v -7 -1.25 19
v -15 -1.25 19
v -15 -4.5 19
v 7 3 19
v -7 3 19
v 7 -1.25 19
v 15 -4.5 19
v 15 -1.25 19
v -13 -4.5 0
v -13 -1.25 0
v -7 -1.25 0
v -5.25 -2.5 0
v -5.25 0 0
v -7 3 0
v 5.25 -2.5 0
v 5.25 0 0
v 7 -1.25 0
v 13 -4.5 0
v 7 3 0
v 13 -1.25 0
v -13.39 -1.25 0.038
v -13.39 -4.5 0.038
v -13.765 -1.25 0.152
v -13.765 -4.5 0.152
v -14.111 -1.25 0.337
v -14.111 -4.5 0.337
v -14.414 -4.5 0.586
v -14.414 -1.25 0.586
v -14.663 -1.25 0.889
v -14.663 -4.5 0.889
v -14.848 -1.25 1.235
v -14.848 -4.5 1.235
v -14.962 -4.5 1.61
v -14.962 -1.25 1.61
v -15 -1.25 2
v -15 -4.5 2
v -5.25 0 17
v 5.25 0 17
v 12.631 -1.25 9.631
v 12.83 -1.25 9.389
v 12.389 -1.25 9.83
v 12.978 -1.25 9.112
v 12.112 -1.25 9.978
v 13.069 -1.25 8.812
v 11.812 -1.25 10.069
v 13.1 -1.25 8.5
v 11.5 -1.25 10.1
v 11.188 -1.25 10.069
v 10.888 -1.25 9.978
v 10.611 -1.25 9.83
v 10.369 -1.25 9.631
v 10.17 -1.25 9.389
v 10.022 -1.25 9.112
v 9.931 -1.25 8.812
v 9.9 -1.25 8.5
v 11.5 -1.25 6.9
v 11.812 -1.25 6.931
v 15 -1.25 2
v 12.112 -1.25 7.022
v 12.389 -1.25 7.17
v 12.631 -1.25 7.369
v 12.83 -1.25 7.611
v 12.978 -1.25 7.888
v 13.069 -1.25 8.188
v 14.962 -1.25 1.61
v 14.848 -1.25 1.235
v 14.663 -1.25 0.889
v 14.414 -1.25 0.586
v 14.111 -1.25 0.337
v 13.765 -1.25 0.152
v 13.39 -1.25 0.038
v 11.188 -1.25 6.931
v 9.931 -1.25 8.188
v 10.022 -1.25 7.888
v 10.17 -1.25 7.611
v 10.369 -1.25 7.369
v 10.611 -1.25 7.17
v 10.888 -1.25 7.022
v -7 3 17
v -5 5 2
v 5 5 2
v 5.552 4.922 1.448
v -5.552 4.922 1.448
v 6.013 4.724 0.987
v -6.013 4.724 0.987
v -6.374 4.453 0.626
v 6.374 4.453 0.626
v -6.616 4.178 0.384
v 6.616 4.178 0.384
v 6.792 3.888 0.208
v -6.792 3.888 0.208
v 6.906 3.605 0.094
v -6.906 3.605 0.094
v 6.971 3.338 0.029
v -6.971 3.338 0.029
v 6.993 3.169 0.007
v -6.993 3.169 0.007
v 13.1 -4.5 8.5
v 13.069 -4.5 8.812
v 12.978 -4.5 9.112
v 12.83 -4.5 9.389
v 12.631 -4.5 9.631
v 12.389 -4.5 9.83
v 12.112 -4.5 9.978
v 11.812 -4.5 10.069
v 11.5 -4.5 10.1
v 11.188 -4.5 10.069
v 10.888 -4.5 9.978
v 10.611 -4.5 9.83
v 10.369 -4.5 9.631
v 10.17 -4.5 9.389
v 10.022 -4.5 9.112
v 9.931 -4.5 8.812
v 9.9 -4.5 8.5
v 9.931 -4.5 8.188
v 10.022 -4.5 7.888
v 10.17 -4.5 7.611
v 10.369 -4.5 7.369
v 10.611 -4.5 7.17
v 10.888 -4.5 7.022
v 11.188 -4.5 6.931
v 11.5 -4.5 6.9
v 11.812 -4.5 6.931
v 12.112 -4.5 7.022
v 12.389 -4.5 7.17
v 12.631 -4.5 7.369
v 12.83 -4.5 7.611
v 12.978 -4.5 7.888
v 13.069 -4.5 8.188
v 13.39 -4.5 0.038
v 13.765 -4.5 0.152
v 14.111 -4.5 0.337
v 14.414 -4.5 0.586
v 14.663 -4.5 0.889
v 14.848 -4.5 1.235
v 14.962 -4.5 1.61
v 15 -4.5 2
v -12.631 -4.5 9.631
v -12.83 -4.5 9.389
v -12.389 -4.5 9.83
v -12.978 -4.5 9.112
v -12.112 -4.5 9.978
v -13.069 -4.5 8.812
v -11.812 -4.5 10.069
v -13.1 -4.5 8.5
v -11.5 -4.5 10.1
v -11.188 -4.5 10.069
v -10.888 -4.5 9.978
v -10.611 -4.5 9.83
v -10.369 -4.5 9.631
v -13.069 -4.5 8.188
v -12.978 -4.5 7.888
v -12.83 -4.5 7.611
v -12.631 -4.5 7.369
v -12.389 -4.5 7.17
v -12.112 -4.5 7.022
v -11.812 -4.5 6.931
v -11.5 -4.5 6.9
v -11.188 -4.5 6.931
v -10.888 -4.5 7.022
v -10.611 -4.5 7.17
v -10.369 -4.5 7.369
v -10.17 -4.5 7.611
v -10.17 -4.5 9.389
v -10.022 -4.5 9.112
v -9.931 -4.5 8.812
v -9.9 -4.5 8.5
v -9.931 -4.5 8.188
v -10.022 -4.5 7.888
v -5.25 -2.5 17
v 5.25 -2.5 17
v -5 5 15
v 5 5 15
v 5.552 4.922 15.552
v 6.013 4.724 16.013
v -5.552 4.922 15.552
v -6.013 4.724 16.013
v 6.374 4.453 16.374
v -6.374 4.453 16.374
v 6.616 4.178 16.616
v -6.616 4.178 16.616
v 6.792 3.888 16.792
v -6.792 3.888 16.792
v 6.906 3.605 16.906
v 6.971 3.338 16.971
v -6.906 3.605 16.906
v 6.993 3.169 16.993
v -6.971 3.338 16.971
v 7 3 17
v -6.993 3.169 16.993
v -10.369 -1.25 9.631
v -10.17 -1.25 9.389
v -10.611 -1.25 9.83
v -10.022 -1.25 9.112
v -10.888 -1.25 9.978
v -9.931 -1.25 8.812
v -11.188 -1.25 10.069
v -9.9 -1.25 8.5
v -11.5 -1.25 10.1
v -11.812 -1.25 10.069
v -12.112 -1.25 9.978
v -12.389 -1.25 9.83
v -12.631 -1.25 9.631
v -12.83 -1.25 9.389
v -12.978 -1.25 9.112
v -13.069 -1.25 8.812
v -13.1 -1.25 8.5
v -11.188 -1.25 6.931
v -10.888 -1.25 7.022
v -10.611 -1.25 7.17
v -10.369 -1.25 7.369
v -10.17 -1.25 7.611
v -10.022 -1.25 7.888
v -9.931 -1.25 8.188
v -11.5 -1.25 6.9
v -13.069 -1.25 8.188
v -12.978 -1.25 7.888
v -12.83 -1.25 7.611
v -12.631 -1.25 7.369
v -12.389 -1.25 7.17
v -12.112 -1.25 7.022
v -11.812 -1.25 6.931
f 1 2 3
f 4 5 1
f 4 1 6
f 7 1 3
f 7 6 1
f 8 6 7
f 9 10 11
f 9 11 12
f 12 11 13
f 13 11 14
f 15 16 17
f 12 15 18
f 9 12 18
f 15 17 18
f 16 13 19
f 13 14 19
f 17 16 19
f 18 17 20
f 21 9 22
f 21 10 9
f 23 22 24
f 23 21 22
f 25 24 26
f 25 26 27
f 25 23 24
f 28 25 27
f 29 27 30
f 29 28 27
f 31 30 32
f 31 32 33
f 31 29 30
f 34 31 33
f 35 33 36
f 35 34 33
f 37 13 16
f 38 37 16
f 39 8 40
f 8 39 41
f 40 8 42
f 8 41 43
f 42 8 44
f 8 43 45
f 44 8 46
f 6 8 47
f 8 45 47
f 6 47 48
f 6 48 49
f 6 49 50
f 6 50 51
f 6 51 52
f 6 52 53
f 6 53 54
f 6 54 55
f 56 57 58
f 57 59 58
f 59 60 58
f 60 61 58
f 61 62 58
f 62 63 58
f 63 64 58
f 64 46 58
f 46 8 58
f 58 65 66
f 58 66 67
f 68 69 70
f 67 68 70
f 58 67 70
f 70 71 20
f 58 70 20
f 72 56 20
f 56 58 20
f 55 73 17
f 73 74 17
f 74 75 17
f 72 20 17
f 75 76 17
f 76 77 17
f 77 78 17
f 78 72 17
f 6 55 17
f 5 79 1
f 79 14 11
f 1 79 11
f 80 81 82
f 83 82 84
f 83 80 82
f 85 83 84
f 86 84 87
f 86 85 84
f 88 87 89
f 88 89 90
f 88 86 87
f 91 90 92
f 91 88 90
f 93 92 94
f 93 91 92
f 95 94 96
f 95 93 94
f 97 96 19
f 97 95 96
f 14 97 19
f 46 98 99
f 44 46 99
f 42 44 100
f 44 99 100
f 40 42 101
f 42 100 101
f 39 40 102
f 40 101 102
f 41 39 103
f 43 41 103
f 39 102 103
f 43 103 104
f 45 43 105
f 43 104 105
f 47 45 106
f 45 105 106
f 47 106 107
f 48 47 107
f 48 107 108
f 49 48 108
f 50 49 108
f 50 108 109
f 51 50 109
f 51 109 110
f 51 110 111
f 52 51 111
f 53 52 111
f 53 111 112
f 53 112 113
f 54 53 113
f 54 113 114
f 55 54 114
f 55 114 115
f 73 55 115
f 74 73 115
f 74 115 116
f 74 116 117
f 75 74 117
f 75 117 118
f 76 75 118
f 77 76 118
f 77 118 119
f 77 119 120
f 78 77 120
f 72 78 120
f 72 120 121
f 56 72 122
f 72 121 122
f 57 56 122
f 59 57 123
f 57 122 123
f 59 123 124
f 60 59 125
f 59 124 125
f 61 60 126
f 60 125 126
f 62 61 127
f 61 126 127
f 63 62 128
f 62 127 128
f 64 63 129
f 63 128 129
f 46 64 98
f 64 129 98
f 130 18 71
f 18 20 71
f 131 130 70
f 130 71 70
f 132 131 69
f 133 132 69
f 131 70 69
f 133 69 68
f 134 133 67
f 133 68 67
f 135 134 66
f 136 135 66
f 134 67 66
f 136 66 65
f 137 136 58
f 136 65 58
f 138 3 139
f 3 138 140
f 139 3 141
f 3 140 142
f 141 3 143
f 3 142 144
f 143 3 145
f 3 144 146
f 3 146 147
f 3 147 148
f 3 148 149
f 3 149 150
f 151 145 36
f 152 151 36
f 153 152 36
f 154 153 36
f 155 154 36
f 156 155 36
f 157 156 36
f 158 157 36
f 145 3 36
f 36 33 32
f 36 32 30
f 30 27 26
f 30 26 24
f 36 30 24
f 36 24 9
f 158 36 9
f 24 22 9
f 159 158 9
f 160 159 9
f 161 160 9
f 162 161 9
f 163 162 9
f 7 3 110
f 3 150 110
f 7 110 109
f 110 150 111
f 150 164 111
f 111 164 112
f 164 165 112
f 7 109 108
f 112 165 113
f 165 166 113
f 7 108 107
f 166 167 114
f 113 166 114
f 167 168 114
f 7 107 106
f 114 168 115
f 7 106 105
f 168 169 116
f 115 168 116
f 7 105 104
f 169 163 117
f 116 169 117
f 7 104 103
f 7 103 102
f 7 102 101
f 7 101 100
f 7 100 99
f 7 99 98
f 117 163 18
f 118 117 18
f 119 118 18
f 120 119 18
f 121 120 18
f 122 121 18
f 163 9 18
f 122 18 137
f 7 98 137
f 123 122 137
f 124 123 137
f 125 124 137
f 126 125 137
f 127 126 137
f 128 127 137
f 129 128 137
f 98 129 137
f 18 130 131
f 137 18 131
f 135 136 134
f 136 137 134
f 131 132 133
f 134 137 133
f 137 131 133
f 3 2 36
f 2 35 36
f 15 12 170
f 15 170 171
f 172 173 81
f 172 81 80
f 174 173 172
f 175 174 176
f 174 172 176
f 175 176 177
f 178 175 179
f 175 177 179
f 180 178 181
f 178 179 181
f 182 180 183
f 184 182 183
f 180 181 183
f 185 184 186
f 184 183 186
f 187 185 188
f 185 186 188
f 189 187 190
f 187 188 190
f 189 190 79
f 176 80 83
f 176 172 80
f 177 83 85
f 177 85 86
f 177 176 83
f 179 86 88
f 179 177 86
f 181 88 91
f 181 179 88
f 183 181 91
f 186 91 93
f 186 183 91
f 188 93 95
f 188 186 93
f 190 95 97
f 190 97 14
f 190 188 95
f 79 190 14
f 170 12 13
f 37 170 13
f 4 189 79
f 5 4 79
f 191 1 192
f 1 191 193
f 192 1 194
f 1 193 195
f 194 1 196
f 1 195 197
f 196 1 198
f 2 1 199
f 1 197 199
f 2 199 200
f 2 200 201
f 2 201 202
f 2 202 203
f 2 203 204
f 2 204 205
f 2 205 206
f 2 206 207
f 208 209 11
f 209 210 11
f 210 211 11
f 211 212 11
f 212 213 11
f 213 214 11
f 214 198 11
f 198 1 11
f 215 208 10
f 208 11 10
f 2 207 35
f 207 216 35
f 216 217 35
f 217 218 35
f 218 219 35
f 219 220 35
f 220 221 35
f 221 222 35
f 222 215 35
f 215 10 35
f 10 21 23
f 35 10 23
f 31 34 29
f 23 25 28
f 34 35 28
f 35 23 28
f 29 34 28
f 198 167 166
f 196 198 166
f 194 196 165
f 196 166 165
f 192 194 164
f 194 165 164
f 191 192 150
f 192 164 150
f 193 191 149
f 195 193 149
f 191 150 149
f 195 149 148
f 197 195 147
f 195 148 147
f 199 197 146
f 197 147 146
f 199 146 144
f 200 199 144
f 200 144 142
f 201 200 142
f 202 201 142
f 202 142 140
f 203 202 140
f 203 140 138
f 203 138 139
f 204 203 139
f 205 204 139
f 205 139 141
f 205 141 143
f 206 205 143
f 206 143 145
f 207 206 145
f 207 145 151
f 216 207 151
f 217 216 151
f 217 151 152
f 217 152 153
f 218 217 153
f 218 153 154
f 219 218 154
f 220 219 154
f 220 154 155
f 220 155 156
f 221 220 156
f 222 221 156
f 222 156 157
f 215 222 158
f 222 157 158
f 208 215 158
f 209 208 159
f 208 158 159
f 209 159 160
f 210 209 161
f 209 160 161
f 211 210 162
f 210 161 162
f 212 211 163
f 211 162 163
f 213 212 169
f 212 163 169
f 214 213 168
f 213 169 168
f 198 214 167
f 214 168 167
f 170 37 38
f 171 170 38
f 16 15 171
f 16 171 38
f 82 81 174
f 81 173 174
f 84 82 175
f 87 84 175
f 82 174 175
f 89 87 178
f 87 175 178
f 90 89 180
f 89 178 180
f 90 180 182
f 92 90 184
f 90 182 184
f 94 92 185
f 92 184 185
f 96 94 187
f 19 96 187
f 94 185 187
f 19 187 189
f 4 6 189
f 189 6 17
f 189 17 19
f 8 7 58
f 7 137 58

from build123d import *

# Parameters (mm, degrees)
F0_W     = 10.5
F0_H     = 2.5
F0_W_2   = 8
F0_H_2   = 3.25
F1_DEPTH = 17
F2_R     = 1.6
F3_DEPTH = 25
F4_R     = 2
F5_W     = 10.5
F5_H     = 2.5
F6_DEPTH = 2


with BuildPart() as f1:
    # F0 (on Top) → F1 (new body)
    with BuildSketch(Plane.XY):
        Polygon((7, 5), (-7, 5), (-7, -1.25), (-7, -4.5), (7, -4.5), (7, -1.25), align=None)
        with Locations((0, -1.25)):
            Rectangle(F0_W, F0_H, mode=Mode.SUBTRACT)
        with Locations((11, -2.875)):
            Rectangle(F0_W_2, F0_H_2)
        with Locations((-11, -2.875)):
            Rectangle(F0_W_2, F0_H_2)
    extrude(amount=F1_DEPTH)

    # F2 (on face) → F3 (cut)
    with BuildSketch(Plane.XZ.offset(4.5)):
        with Locations((11.5, 8.5)):
            Circle(F2_R)
        with Locations((-11.5, 8.5)):
            Circle(F2_R)
    extrude(amount=-F3_DEPTH, mode=Mode.SUBTRACT)

    # F4
    f4_edges = [f1.edges().sort_by_distance(p)[0] for p in [
        (0, 5, 0),
        (-7, 5, 8.5),
        (0, 5, 17),
        (7, 5, 8.5),
        (-15, -2.875, 0),
        (15, -2.875, 0),
    ]]
    fillet(f4_edges, radius=F4_R)

    # F5 (on face) → F6 (join)
    with BuildSketch(Plane.XY.offset(17)):
        Polygon((-7, -1.25), (-15, -1.25), (-15, -4.5), (15, -4.5), (15, -1.25), (7, -1.25), (7, 3), (-7, 3), align=None)
        with Locations((0, -1.25)):
            Rectangle(F5_W, F5_H, mode=Mode.SUBTRACT)
        with Locations((0, -1.25)):
            Rectangle(F5_W, F5_H)
    extrude(amount=F6_DEPTH)


solid = f1.part
